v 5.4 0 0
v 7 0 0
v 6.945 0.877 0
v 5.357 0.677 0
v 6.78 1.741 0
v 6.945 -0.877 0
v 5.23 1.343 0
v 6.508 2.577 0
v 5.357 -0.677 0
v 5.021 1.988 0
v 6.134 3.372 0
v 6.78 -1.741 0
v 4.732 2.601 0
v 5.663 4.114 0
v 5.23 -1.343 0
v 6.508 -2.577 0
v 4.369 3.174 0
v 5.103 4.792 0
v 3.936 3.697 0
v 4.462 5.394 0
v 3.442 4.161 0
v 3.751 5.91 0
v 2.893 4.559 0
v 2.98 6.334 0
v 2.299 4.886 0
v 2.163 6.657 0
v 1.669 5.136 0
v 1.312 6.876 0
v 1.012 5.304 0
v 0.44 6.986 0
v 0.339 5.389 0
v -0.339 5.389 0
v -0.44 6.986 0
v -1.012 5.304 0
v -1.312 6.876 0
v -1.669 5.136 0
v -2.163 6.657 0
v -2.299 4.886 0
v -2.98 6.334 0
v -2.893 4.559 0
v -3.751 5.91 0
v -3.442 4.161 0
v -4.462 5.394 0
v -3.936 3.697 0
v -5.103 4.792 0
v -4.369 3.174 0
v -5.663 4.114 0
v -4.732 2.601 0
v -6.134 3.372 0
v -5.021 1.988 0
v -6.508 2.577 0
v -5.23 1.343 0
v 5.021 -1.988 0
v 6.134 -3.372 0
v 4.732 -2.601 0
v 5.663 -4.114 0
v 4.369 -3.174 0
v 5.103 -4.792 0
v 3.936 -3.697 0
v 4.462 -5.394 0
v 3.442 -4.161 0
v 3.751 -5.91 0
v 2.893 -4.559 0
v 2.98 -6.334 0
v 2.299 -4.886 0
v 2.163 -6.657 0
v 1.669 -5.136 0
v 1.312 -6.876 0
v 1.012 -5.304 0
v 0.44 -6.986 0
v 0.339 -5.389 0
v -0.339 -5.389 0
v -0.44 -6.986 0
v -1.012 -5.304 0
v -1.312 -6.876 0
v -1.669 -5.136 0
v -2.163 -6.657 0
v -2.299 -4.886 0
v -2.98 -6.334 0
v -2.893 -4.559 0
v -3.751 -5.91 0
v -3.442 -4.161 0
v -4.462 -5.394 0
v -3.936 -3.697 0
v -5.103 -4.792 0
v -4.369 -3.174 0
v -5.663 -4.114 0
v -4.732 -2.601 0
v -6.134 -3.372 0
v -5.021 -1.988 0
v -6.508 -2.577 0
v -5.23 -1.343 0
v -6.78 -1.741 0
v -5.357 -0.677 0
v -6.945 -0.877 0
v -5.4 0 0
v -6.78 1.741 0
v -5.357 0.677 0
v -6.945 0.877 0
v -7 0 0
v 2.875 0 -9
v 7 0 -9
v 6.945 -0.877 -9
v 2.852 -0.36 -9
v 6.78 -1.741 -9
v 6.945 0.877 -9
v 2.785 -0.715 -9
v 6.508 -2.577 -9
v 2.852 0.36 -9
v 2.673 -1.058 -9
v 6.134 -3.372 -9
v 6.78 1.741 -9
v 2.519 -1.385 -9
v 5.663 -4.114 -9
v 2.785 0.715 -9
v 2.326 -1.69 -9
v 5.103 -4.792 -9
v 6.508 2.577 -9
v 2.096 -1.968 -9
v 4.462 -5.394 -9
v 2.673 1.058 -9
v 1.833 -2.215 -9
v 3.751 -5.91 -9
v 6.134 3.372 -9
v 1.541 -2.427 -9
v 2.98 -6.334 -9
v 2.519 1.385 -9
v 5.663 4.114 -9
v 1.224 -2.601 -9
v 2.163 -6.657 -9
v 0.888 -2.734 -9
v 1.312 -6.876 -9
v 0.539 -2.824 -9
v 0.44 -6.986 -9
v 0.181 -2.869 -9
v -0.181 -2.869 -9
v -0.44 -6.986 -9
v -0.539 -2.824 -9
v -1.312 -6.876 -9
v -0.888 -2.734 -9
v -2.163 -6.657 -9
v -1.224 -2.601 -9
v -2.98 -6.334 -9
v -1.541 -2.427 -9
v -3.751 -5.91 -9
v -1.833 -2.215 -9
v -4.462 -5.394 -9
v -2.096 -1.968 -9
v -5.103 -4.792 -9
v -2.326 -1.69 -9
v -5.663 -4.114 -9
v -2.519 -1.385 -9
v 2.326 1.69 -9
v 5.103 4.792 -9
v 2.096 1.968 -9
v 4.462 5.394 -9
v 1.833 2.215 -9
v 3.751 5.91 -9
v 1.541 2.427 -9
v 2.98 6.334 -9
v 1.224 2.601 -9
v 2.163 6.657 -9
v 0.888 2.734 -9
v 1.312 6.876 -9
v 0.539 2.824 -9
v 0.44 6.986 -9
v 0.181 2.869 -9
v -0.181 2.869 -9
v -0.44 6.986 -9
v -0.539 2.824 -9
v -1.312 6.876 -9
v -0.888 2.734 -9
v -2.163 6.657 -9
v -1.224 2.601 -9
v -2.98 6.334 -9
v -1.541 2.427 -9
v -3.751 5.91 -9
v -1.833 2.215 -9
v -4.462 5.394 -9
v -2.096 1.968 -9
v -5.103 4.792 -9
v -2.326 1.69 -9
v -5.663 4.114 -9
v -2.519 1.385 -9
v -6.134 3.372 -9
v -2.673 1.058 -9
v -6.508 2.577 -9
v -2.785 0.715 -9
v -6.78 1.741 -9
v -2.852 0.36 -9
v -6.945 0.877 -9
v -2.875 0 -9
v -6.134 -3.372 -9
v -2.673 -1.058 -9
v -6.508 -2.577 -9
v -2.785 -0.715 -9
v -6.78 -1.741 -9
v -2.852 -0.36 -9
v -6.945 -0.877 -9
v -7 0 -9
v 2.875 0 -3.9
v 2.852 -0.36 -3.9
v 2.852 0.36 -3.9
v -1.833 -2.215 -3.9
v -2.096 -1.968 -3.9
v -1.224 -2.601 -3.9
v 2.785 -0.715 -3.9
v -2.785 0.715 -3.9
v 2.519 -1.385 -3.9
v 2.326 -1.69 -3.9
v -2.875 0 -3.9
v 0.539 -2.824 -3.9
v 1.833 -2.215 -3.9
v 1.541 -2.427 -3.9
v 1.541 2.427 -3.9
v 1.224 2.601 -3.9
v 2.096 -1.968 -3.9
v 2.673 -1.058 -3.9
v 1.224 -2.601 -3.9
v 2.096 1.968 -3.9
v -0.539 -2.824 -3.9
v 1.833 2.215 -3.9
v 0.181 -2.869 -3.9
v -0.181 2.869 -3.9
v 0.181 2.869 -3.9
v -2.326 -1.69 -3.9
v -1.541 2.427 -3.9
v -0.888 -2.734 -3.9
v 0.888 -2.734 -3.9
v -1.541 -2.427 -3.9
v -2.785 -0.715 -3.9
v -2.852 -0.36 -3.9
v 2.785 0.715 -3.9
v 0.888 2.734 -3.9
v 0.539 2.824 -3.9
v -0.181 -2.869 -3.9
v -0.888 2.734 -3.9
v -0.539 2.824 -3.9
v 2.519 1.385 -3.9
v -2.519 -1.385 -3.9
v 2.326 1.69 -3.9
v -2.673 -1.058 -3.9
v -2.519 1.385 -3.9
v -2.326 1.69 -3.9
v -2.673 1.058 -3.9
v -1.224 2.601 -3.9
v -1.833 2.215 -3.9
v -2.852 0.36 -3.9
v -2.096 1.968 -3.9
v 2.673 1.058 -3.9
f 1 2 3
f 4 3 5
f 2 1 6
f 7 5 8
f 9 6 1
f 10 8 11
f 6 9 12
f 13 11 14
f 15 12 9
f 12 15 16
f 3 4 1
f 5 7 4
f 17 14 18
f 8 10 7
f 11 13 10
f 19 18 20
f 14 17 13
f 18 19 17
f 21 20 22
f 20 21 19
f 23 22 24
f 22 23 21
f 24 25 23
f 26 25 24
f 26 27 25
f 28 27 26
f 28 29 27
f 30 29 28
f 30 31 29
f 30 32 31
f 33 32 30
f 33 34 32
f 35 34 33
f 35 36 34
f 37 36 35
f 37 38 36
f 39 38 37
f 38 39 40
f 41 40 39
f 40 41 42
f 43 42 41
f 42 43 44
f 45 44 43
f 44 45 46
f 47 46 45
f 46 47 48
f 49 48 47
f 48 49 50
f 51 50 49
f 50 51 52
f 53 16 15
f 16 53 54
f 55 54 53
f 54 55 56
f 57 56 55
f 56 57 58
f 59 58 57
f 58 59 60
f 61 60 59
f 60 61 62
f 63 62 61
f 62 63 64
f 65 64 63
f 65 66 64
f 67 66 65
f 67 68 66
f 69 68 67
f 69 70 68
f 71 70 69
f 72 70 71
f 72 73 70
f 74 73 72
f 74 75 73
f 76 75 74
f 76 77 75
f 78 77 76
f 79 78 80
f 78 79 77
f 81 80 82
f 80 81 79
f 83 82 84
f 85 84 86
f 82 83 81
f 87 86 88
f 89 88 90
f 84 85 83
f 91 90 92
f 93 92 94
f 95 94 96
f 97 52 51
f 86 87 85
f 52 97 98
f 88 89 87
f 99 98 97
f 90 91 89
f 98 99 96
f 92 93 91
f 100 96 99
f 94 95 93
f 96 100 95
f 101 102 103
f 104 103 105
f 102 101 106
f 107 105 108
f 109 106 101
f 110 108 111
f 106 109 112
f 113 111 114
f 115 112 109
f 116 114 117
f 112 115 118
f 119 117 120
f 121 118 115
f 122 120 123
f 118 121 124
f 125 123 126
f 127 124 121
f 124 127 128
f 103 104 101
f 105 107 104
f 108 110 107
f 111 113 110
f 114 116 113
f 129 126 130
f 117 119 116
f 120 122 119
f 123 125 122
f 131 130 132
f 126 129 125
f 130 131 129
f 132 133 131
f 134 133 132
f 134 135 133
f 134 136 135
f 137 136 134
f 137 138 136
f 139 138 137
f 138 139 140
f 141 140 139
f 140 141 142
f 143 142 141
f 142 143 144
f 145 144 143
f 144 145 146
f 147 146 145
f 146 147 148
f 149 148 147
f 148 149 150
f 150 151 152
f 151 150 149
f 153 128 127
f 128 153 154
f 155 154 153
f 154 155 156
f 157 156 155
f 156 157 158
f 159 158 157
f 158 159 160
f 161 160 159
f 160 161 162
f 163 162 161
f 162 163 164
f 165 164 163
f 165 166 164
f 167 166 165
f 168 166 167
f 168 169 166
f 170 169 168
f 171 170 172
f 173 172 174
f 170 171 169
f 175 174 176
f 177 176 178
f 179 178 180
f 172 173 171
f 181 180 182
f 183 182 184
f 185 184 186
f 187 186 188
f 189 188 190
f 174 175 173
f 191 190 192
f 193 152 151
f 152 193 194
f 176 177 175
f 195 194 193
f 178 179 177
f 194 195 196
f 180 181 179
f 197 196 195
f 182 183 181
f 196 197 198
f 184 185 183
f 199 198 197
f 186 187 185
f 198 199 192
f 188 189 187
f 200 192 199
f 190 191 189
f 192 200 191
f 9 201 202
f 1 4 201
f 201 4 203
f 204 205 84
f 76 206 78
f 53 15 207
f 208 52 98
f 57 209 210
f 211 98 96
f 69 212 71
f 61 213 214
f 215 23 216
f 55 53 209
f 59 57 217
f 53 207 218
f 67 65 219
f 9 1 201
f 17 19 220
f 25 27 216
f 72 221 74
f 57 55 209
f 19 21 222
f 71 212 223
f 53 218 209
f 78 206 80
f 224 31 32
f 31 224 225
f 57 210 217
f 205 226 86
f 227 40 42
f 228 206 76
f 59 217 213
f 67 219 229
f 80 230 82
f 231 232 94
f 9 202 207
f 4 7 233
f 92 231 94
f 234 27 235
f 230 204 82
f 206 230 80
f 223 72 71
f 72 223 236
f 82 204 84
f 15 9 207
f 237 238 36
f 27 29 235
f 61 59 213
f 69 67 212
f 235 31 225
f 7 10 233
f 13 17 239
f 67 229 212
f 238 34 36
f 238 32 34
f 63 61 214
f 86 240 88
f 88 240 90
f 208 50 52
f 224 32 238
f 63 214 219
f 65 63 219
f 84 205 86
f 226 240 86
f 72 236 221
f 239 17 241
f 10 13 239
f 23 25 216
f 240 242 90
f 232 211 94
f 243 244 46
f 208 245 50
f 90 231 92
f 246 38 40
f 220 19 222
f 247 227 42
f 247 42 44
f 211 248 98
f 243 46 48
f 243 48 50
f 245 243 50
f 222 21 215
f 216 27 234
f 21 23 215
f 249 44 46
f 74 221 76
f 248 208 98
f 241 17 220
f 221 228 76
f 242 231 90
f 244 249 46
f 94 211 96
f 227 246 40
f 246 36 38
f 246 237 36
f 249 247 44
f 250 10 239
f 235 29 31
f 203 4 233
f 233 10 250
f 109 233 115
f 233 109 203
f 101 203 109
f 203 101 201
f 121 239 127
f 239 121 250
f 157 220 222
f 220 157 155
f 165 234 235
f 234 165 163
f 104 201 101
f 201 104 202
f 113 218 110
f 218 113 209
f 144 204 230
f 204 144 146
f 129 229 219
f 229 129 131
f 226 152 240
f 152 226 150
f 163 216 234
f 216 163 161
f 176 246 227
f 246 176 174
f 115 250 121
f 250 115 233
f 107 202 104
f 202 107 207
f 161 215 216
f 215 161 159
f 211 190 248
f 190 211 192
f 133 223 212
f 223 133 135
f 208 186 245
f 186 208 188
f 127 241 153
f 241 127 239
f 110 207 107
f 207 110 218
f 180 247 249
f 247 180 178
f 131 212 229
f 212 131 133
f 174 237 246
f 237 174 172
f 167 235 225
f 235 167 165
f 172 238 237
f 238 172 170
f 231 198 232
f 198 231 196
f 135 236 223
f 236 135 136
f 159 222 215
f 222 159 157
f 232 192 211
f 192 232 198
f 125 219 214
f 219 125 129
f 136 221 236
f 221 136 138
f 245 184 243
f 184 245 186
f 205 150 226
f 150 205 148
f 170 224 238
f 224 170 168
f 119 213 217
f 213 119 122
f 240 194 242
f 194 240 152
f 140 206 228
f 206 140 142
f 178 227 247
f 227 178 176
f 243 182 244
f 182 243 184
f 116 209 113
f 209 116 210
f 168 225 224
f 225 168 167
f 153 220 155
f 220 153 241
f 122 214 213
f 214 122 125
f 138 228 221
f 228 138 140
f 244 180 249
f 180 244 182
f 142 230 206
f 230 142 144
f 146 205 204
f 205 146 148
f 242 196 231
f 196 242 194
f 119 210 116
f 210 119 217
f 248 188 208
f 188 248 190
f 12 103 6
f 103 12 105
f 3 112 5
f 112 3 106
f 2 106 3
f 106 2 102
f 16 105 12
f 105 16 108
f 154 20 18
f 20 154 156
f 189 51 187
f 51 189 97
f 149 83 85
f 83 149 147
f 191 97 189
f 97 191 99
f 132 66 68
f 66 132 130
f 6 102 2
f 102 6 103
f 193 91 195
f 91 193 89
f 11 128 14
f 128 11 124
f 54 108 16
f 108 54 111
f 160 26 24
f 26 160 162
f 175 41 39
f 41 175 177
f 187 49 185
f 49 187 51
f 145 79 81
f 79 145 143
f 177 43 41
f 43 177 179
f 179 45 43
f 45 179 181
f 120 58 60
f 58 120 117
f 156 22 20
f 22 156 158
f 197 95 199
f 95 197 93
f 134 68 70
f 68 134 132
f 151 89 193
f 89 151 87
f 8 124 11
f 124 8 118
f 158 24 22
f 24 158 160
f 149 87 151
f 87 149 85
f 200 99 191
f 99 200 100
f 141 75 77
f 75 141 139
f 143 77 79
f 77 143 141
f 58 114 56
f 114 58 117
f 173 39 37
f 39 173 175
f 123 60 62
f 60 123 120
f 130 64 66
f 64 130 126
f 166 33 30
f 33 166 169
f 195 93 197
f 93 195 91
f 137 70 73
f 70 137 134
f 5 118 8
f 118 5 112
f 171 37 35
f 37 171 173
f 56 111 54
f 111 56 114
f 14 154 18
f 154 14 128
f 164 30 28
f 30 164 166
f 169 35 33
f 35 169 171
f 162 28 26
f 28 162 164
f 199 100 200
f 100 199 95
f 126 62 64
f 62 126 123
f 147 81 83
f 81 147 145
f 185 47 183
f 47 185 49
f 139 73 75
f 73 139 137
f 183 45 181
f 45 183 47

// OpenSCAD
$fn = 50;


difference() {
	union() {
		translate(v = [0, 0, -9.0000000000]) {
			cylinder(h = 9, r = 7.0000000000);
		}
		cylinder(h = 0, r = 13.0000000000);
	}
	union() {
		translate(v = [0, 0, 0]) {
			rotate(a = [0, 0, 0]) {
				difference() {
					union() {
						#translate(v = [0, 0, -9.0000000000]) {
							cylinder(h = 9, r = 2.6000000000);
						}
						#translate(v = [0, 0, -3.9000000000]) {
							cylinder(h = 3.9000000000, r = 7.0000000000, r1 = 2.8750000000, r2 = 5.4000000000);
						}
						#translate(v = [0, 0, -9.0000000000]) {
							cylinder(h = 9, r = 2.8750000000);
						}
						#translate(v = [0, 0, -9.0000000000]) {
							cylinder(h = 9, r = 2.6000000000);
						}
					}
					union();
				}
			}
		}
	}
}
